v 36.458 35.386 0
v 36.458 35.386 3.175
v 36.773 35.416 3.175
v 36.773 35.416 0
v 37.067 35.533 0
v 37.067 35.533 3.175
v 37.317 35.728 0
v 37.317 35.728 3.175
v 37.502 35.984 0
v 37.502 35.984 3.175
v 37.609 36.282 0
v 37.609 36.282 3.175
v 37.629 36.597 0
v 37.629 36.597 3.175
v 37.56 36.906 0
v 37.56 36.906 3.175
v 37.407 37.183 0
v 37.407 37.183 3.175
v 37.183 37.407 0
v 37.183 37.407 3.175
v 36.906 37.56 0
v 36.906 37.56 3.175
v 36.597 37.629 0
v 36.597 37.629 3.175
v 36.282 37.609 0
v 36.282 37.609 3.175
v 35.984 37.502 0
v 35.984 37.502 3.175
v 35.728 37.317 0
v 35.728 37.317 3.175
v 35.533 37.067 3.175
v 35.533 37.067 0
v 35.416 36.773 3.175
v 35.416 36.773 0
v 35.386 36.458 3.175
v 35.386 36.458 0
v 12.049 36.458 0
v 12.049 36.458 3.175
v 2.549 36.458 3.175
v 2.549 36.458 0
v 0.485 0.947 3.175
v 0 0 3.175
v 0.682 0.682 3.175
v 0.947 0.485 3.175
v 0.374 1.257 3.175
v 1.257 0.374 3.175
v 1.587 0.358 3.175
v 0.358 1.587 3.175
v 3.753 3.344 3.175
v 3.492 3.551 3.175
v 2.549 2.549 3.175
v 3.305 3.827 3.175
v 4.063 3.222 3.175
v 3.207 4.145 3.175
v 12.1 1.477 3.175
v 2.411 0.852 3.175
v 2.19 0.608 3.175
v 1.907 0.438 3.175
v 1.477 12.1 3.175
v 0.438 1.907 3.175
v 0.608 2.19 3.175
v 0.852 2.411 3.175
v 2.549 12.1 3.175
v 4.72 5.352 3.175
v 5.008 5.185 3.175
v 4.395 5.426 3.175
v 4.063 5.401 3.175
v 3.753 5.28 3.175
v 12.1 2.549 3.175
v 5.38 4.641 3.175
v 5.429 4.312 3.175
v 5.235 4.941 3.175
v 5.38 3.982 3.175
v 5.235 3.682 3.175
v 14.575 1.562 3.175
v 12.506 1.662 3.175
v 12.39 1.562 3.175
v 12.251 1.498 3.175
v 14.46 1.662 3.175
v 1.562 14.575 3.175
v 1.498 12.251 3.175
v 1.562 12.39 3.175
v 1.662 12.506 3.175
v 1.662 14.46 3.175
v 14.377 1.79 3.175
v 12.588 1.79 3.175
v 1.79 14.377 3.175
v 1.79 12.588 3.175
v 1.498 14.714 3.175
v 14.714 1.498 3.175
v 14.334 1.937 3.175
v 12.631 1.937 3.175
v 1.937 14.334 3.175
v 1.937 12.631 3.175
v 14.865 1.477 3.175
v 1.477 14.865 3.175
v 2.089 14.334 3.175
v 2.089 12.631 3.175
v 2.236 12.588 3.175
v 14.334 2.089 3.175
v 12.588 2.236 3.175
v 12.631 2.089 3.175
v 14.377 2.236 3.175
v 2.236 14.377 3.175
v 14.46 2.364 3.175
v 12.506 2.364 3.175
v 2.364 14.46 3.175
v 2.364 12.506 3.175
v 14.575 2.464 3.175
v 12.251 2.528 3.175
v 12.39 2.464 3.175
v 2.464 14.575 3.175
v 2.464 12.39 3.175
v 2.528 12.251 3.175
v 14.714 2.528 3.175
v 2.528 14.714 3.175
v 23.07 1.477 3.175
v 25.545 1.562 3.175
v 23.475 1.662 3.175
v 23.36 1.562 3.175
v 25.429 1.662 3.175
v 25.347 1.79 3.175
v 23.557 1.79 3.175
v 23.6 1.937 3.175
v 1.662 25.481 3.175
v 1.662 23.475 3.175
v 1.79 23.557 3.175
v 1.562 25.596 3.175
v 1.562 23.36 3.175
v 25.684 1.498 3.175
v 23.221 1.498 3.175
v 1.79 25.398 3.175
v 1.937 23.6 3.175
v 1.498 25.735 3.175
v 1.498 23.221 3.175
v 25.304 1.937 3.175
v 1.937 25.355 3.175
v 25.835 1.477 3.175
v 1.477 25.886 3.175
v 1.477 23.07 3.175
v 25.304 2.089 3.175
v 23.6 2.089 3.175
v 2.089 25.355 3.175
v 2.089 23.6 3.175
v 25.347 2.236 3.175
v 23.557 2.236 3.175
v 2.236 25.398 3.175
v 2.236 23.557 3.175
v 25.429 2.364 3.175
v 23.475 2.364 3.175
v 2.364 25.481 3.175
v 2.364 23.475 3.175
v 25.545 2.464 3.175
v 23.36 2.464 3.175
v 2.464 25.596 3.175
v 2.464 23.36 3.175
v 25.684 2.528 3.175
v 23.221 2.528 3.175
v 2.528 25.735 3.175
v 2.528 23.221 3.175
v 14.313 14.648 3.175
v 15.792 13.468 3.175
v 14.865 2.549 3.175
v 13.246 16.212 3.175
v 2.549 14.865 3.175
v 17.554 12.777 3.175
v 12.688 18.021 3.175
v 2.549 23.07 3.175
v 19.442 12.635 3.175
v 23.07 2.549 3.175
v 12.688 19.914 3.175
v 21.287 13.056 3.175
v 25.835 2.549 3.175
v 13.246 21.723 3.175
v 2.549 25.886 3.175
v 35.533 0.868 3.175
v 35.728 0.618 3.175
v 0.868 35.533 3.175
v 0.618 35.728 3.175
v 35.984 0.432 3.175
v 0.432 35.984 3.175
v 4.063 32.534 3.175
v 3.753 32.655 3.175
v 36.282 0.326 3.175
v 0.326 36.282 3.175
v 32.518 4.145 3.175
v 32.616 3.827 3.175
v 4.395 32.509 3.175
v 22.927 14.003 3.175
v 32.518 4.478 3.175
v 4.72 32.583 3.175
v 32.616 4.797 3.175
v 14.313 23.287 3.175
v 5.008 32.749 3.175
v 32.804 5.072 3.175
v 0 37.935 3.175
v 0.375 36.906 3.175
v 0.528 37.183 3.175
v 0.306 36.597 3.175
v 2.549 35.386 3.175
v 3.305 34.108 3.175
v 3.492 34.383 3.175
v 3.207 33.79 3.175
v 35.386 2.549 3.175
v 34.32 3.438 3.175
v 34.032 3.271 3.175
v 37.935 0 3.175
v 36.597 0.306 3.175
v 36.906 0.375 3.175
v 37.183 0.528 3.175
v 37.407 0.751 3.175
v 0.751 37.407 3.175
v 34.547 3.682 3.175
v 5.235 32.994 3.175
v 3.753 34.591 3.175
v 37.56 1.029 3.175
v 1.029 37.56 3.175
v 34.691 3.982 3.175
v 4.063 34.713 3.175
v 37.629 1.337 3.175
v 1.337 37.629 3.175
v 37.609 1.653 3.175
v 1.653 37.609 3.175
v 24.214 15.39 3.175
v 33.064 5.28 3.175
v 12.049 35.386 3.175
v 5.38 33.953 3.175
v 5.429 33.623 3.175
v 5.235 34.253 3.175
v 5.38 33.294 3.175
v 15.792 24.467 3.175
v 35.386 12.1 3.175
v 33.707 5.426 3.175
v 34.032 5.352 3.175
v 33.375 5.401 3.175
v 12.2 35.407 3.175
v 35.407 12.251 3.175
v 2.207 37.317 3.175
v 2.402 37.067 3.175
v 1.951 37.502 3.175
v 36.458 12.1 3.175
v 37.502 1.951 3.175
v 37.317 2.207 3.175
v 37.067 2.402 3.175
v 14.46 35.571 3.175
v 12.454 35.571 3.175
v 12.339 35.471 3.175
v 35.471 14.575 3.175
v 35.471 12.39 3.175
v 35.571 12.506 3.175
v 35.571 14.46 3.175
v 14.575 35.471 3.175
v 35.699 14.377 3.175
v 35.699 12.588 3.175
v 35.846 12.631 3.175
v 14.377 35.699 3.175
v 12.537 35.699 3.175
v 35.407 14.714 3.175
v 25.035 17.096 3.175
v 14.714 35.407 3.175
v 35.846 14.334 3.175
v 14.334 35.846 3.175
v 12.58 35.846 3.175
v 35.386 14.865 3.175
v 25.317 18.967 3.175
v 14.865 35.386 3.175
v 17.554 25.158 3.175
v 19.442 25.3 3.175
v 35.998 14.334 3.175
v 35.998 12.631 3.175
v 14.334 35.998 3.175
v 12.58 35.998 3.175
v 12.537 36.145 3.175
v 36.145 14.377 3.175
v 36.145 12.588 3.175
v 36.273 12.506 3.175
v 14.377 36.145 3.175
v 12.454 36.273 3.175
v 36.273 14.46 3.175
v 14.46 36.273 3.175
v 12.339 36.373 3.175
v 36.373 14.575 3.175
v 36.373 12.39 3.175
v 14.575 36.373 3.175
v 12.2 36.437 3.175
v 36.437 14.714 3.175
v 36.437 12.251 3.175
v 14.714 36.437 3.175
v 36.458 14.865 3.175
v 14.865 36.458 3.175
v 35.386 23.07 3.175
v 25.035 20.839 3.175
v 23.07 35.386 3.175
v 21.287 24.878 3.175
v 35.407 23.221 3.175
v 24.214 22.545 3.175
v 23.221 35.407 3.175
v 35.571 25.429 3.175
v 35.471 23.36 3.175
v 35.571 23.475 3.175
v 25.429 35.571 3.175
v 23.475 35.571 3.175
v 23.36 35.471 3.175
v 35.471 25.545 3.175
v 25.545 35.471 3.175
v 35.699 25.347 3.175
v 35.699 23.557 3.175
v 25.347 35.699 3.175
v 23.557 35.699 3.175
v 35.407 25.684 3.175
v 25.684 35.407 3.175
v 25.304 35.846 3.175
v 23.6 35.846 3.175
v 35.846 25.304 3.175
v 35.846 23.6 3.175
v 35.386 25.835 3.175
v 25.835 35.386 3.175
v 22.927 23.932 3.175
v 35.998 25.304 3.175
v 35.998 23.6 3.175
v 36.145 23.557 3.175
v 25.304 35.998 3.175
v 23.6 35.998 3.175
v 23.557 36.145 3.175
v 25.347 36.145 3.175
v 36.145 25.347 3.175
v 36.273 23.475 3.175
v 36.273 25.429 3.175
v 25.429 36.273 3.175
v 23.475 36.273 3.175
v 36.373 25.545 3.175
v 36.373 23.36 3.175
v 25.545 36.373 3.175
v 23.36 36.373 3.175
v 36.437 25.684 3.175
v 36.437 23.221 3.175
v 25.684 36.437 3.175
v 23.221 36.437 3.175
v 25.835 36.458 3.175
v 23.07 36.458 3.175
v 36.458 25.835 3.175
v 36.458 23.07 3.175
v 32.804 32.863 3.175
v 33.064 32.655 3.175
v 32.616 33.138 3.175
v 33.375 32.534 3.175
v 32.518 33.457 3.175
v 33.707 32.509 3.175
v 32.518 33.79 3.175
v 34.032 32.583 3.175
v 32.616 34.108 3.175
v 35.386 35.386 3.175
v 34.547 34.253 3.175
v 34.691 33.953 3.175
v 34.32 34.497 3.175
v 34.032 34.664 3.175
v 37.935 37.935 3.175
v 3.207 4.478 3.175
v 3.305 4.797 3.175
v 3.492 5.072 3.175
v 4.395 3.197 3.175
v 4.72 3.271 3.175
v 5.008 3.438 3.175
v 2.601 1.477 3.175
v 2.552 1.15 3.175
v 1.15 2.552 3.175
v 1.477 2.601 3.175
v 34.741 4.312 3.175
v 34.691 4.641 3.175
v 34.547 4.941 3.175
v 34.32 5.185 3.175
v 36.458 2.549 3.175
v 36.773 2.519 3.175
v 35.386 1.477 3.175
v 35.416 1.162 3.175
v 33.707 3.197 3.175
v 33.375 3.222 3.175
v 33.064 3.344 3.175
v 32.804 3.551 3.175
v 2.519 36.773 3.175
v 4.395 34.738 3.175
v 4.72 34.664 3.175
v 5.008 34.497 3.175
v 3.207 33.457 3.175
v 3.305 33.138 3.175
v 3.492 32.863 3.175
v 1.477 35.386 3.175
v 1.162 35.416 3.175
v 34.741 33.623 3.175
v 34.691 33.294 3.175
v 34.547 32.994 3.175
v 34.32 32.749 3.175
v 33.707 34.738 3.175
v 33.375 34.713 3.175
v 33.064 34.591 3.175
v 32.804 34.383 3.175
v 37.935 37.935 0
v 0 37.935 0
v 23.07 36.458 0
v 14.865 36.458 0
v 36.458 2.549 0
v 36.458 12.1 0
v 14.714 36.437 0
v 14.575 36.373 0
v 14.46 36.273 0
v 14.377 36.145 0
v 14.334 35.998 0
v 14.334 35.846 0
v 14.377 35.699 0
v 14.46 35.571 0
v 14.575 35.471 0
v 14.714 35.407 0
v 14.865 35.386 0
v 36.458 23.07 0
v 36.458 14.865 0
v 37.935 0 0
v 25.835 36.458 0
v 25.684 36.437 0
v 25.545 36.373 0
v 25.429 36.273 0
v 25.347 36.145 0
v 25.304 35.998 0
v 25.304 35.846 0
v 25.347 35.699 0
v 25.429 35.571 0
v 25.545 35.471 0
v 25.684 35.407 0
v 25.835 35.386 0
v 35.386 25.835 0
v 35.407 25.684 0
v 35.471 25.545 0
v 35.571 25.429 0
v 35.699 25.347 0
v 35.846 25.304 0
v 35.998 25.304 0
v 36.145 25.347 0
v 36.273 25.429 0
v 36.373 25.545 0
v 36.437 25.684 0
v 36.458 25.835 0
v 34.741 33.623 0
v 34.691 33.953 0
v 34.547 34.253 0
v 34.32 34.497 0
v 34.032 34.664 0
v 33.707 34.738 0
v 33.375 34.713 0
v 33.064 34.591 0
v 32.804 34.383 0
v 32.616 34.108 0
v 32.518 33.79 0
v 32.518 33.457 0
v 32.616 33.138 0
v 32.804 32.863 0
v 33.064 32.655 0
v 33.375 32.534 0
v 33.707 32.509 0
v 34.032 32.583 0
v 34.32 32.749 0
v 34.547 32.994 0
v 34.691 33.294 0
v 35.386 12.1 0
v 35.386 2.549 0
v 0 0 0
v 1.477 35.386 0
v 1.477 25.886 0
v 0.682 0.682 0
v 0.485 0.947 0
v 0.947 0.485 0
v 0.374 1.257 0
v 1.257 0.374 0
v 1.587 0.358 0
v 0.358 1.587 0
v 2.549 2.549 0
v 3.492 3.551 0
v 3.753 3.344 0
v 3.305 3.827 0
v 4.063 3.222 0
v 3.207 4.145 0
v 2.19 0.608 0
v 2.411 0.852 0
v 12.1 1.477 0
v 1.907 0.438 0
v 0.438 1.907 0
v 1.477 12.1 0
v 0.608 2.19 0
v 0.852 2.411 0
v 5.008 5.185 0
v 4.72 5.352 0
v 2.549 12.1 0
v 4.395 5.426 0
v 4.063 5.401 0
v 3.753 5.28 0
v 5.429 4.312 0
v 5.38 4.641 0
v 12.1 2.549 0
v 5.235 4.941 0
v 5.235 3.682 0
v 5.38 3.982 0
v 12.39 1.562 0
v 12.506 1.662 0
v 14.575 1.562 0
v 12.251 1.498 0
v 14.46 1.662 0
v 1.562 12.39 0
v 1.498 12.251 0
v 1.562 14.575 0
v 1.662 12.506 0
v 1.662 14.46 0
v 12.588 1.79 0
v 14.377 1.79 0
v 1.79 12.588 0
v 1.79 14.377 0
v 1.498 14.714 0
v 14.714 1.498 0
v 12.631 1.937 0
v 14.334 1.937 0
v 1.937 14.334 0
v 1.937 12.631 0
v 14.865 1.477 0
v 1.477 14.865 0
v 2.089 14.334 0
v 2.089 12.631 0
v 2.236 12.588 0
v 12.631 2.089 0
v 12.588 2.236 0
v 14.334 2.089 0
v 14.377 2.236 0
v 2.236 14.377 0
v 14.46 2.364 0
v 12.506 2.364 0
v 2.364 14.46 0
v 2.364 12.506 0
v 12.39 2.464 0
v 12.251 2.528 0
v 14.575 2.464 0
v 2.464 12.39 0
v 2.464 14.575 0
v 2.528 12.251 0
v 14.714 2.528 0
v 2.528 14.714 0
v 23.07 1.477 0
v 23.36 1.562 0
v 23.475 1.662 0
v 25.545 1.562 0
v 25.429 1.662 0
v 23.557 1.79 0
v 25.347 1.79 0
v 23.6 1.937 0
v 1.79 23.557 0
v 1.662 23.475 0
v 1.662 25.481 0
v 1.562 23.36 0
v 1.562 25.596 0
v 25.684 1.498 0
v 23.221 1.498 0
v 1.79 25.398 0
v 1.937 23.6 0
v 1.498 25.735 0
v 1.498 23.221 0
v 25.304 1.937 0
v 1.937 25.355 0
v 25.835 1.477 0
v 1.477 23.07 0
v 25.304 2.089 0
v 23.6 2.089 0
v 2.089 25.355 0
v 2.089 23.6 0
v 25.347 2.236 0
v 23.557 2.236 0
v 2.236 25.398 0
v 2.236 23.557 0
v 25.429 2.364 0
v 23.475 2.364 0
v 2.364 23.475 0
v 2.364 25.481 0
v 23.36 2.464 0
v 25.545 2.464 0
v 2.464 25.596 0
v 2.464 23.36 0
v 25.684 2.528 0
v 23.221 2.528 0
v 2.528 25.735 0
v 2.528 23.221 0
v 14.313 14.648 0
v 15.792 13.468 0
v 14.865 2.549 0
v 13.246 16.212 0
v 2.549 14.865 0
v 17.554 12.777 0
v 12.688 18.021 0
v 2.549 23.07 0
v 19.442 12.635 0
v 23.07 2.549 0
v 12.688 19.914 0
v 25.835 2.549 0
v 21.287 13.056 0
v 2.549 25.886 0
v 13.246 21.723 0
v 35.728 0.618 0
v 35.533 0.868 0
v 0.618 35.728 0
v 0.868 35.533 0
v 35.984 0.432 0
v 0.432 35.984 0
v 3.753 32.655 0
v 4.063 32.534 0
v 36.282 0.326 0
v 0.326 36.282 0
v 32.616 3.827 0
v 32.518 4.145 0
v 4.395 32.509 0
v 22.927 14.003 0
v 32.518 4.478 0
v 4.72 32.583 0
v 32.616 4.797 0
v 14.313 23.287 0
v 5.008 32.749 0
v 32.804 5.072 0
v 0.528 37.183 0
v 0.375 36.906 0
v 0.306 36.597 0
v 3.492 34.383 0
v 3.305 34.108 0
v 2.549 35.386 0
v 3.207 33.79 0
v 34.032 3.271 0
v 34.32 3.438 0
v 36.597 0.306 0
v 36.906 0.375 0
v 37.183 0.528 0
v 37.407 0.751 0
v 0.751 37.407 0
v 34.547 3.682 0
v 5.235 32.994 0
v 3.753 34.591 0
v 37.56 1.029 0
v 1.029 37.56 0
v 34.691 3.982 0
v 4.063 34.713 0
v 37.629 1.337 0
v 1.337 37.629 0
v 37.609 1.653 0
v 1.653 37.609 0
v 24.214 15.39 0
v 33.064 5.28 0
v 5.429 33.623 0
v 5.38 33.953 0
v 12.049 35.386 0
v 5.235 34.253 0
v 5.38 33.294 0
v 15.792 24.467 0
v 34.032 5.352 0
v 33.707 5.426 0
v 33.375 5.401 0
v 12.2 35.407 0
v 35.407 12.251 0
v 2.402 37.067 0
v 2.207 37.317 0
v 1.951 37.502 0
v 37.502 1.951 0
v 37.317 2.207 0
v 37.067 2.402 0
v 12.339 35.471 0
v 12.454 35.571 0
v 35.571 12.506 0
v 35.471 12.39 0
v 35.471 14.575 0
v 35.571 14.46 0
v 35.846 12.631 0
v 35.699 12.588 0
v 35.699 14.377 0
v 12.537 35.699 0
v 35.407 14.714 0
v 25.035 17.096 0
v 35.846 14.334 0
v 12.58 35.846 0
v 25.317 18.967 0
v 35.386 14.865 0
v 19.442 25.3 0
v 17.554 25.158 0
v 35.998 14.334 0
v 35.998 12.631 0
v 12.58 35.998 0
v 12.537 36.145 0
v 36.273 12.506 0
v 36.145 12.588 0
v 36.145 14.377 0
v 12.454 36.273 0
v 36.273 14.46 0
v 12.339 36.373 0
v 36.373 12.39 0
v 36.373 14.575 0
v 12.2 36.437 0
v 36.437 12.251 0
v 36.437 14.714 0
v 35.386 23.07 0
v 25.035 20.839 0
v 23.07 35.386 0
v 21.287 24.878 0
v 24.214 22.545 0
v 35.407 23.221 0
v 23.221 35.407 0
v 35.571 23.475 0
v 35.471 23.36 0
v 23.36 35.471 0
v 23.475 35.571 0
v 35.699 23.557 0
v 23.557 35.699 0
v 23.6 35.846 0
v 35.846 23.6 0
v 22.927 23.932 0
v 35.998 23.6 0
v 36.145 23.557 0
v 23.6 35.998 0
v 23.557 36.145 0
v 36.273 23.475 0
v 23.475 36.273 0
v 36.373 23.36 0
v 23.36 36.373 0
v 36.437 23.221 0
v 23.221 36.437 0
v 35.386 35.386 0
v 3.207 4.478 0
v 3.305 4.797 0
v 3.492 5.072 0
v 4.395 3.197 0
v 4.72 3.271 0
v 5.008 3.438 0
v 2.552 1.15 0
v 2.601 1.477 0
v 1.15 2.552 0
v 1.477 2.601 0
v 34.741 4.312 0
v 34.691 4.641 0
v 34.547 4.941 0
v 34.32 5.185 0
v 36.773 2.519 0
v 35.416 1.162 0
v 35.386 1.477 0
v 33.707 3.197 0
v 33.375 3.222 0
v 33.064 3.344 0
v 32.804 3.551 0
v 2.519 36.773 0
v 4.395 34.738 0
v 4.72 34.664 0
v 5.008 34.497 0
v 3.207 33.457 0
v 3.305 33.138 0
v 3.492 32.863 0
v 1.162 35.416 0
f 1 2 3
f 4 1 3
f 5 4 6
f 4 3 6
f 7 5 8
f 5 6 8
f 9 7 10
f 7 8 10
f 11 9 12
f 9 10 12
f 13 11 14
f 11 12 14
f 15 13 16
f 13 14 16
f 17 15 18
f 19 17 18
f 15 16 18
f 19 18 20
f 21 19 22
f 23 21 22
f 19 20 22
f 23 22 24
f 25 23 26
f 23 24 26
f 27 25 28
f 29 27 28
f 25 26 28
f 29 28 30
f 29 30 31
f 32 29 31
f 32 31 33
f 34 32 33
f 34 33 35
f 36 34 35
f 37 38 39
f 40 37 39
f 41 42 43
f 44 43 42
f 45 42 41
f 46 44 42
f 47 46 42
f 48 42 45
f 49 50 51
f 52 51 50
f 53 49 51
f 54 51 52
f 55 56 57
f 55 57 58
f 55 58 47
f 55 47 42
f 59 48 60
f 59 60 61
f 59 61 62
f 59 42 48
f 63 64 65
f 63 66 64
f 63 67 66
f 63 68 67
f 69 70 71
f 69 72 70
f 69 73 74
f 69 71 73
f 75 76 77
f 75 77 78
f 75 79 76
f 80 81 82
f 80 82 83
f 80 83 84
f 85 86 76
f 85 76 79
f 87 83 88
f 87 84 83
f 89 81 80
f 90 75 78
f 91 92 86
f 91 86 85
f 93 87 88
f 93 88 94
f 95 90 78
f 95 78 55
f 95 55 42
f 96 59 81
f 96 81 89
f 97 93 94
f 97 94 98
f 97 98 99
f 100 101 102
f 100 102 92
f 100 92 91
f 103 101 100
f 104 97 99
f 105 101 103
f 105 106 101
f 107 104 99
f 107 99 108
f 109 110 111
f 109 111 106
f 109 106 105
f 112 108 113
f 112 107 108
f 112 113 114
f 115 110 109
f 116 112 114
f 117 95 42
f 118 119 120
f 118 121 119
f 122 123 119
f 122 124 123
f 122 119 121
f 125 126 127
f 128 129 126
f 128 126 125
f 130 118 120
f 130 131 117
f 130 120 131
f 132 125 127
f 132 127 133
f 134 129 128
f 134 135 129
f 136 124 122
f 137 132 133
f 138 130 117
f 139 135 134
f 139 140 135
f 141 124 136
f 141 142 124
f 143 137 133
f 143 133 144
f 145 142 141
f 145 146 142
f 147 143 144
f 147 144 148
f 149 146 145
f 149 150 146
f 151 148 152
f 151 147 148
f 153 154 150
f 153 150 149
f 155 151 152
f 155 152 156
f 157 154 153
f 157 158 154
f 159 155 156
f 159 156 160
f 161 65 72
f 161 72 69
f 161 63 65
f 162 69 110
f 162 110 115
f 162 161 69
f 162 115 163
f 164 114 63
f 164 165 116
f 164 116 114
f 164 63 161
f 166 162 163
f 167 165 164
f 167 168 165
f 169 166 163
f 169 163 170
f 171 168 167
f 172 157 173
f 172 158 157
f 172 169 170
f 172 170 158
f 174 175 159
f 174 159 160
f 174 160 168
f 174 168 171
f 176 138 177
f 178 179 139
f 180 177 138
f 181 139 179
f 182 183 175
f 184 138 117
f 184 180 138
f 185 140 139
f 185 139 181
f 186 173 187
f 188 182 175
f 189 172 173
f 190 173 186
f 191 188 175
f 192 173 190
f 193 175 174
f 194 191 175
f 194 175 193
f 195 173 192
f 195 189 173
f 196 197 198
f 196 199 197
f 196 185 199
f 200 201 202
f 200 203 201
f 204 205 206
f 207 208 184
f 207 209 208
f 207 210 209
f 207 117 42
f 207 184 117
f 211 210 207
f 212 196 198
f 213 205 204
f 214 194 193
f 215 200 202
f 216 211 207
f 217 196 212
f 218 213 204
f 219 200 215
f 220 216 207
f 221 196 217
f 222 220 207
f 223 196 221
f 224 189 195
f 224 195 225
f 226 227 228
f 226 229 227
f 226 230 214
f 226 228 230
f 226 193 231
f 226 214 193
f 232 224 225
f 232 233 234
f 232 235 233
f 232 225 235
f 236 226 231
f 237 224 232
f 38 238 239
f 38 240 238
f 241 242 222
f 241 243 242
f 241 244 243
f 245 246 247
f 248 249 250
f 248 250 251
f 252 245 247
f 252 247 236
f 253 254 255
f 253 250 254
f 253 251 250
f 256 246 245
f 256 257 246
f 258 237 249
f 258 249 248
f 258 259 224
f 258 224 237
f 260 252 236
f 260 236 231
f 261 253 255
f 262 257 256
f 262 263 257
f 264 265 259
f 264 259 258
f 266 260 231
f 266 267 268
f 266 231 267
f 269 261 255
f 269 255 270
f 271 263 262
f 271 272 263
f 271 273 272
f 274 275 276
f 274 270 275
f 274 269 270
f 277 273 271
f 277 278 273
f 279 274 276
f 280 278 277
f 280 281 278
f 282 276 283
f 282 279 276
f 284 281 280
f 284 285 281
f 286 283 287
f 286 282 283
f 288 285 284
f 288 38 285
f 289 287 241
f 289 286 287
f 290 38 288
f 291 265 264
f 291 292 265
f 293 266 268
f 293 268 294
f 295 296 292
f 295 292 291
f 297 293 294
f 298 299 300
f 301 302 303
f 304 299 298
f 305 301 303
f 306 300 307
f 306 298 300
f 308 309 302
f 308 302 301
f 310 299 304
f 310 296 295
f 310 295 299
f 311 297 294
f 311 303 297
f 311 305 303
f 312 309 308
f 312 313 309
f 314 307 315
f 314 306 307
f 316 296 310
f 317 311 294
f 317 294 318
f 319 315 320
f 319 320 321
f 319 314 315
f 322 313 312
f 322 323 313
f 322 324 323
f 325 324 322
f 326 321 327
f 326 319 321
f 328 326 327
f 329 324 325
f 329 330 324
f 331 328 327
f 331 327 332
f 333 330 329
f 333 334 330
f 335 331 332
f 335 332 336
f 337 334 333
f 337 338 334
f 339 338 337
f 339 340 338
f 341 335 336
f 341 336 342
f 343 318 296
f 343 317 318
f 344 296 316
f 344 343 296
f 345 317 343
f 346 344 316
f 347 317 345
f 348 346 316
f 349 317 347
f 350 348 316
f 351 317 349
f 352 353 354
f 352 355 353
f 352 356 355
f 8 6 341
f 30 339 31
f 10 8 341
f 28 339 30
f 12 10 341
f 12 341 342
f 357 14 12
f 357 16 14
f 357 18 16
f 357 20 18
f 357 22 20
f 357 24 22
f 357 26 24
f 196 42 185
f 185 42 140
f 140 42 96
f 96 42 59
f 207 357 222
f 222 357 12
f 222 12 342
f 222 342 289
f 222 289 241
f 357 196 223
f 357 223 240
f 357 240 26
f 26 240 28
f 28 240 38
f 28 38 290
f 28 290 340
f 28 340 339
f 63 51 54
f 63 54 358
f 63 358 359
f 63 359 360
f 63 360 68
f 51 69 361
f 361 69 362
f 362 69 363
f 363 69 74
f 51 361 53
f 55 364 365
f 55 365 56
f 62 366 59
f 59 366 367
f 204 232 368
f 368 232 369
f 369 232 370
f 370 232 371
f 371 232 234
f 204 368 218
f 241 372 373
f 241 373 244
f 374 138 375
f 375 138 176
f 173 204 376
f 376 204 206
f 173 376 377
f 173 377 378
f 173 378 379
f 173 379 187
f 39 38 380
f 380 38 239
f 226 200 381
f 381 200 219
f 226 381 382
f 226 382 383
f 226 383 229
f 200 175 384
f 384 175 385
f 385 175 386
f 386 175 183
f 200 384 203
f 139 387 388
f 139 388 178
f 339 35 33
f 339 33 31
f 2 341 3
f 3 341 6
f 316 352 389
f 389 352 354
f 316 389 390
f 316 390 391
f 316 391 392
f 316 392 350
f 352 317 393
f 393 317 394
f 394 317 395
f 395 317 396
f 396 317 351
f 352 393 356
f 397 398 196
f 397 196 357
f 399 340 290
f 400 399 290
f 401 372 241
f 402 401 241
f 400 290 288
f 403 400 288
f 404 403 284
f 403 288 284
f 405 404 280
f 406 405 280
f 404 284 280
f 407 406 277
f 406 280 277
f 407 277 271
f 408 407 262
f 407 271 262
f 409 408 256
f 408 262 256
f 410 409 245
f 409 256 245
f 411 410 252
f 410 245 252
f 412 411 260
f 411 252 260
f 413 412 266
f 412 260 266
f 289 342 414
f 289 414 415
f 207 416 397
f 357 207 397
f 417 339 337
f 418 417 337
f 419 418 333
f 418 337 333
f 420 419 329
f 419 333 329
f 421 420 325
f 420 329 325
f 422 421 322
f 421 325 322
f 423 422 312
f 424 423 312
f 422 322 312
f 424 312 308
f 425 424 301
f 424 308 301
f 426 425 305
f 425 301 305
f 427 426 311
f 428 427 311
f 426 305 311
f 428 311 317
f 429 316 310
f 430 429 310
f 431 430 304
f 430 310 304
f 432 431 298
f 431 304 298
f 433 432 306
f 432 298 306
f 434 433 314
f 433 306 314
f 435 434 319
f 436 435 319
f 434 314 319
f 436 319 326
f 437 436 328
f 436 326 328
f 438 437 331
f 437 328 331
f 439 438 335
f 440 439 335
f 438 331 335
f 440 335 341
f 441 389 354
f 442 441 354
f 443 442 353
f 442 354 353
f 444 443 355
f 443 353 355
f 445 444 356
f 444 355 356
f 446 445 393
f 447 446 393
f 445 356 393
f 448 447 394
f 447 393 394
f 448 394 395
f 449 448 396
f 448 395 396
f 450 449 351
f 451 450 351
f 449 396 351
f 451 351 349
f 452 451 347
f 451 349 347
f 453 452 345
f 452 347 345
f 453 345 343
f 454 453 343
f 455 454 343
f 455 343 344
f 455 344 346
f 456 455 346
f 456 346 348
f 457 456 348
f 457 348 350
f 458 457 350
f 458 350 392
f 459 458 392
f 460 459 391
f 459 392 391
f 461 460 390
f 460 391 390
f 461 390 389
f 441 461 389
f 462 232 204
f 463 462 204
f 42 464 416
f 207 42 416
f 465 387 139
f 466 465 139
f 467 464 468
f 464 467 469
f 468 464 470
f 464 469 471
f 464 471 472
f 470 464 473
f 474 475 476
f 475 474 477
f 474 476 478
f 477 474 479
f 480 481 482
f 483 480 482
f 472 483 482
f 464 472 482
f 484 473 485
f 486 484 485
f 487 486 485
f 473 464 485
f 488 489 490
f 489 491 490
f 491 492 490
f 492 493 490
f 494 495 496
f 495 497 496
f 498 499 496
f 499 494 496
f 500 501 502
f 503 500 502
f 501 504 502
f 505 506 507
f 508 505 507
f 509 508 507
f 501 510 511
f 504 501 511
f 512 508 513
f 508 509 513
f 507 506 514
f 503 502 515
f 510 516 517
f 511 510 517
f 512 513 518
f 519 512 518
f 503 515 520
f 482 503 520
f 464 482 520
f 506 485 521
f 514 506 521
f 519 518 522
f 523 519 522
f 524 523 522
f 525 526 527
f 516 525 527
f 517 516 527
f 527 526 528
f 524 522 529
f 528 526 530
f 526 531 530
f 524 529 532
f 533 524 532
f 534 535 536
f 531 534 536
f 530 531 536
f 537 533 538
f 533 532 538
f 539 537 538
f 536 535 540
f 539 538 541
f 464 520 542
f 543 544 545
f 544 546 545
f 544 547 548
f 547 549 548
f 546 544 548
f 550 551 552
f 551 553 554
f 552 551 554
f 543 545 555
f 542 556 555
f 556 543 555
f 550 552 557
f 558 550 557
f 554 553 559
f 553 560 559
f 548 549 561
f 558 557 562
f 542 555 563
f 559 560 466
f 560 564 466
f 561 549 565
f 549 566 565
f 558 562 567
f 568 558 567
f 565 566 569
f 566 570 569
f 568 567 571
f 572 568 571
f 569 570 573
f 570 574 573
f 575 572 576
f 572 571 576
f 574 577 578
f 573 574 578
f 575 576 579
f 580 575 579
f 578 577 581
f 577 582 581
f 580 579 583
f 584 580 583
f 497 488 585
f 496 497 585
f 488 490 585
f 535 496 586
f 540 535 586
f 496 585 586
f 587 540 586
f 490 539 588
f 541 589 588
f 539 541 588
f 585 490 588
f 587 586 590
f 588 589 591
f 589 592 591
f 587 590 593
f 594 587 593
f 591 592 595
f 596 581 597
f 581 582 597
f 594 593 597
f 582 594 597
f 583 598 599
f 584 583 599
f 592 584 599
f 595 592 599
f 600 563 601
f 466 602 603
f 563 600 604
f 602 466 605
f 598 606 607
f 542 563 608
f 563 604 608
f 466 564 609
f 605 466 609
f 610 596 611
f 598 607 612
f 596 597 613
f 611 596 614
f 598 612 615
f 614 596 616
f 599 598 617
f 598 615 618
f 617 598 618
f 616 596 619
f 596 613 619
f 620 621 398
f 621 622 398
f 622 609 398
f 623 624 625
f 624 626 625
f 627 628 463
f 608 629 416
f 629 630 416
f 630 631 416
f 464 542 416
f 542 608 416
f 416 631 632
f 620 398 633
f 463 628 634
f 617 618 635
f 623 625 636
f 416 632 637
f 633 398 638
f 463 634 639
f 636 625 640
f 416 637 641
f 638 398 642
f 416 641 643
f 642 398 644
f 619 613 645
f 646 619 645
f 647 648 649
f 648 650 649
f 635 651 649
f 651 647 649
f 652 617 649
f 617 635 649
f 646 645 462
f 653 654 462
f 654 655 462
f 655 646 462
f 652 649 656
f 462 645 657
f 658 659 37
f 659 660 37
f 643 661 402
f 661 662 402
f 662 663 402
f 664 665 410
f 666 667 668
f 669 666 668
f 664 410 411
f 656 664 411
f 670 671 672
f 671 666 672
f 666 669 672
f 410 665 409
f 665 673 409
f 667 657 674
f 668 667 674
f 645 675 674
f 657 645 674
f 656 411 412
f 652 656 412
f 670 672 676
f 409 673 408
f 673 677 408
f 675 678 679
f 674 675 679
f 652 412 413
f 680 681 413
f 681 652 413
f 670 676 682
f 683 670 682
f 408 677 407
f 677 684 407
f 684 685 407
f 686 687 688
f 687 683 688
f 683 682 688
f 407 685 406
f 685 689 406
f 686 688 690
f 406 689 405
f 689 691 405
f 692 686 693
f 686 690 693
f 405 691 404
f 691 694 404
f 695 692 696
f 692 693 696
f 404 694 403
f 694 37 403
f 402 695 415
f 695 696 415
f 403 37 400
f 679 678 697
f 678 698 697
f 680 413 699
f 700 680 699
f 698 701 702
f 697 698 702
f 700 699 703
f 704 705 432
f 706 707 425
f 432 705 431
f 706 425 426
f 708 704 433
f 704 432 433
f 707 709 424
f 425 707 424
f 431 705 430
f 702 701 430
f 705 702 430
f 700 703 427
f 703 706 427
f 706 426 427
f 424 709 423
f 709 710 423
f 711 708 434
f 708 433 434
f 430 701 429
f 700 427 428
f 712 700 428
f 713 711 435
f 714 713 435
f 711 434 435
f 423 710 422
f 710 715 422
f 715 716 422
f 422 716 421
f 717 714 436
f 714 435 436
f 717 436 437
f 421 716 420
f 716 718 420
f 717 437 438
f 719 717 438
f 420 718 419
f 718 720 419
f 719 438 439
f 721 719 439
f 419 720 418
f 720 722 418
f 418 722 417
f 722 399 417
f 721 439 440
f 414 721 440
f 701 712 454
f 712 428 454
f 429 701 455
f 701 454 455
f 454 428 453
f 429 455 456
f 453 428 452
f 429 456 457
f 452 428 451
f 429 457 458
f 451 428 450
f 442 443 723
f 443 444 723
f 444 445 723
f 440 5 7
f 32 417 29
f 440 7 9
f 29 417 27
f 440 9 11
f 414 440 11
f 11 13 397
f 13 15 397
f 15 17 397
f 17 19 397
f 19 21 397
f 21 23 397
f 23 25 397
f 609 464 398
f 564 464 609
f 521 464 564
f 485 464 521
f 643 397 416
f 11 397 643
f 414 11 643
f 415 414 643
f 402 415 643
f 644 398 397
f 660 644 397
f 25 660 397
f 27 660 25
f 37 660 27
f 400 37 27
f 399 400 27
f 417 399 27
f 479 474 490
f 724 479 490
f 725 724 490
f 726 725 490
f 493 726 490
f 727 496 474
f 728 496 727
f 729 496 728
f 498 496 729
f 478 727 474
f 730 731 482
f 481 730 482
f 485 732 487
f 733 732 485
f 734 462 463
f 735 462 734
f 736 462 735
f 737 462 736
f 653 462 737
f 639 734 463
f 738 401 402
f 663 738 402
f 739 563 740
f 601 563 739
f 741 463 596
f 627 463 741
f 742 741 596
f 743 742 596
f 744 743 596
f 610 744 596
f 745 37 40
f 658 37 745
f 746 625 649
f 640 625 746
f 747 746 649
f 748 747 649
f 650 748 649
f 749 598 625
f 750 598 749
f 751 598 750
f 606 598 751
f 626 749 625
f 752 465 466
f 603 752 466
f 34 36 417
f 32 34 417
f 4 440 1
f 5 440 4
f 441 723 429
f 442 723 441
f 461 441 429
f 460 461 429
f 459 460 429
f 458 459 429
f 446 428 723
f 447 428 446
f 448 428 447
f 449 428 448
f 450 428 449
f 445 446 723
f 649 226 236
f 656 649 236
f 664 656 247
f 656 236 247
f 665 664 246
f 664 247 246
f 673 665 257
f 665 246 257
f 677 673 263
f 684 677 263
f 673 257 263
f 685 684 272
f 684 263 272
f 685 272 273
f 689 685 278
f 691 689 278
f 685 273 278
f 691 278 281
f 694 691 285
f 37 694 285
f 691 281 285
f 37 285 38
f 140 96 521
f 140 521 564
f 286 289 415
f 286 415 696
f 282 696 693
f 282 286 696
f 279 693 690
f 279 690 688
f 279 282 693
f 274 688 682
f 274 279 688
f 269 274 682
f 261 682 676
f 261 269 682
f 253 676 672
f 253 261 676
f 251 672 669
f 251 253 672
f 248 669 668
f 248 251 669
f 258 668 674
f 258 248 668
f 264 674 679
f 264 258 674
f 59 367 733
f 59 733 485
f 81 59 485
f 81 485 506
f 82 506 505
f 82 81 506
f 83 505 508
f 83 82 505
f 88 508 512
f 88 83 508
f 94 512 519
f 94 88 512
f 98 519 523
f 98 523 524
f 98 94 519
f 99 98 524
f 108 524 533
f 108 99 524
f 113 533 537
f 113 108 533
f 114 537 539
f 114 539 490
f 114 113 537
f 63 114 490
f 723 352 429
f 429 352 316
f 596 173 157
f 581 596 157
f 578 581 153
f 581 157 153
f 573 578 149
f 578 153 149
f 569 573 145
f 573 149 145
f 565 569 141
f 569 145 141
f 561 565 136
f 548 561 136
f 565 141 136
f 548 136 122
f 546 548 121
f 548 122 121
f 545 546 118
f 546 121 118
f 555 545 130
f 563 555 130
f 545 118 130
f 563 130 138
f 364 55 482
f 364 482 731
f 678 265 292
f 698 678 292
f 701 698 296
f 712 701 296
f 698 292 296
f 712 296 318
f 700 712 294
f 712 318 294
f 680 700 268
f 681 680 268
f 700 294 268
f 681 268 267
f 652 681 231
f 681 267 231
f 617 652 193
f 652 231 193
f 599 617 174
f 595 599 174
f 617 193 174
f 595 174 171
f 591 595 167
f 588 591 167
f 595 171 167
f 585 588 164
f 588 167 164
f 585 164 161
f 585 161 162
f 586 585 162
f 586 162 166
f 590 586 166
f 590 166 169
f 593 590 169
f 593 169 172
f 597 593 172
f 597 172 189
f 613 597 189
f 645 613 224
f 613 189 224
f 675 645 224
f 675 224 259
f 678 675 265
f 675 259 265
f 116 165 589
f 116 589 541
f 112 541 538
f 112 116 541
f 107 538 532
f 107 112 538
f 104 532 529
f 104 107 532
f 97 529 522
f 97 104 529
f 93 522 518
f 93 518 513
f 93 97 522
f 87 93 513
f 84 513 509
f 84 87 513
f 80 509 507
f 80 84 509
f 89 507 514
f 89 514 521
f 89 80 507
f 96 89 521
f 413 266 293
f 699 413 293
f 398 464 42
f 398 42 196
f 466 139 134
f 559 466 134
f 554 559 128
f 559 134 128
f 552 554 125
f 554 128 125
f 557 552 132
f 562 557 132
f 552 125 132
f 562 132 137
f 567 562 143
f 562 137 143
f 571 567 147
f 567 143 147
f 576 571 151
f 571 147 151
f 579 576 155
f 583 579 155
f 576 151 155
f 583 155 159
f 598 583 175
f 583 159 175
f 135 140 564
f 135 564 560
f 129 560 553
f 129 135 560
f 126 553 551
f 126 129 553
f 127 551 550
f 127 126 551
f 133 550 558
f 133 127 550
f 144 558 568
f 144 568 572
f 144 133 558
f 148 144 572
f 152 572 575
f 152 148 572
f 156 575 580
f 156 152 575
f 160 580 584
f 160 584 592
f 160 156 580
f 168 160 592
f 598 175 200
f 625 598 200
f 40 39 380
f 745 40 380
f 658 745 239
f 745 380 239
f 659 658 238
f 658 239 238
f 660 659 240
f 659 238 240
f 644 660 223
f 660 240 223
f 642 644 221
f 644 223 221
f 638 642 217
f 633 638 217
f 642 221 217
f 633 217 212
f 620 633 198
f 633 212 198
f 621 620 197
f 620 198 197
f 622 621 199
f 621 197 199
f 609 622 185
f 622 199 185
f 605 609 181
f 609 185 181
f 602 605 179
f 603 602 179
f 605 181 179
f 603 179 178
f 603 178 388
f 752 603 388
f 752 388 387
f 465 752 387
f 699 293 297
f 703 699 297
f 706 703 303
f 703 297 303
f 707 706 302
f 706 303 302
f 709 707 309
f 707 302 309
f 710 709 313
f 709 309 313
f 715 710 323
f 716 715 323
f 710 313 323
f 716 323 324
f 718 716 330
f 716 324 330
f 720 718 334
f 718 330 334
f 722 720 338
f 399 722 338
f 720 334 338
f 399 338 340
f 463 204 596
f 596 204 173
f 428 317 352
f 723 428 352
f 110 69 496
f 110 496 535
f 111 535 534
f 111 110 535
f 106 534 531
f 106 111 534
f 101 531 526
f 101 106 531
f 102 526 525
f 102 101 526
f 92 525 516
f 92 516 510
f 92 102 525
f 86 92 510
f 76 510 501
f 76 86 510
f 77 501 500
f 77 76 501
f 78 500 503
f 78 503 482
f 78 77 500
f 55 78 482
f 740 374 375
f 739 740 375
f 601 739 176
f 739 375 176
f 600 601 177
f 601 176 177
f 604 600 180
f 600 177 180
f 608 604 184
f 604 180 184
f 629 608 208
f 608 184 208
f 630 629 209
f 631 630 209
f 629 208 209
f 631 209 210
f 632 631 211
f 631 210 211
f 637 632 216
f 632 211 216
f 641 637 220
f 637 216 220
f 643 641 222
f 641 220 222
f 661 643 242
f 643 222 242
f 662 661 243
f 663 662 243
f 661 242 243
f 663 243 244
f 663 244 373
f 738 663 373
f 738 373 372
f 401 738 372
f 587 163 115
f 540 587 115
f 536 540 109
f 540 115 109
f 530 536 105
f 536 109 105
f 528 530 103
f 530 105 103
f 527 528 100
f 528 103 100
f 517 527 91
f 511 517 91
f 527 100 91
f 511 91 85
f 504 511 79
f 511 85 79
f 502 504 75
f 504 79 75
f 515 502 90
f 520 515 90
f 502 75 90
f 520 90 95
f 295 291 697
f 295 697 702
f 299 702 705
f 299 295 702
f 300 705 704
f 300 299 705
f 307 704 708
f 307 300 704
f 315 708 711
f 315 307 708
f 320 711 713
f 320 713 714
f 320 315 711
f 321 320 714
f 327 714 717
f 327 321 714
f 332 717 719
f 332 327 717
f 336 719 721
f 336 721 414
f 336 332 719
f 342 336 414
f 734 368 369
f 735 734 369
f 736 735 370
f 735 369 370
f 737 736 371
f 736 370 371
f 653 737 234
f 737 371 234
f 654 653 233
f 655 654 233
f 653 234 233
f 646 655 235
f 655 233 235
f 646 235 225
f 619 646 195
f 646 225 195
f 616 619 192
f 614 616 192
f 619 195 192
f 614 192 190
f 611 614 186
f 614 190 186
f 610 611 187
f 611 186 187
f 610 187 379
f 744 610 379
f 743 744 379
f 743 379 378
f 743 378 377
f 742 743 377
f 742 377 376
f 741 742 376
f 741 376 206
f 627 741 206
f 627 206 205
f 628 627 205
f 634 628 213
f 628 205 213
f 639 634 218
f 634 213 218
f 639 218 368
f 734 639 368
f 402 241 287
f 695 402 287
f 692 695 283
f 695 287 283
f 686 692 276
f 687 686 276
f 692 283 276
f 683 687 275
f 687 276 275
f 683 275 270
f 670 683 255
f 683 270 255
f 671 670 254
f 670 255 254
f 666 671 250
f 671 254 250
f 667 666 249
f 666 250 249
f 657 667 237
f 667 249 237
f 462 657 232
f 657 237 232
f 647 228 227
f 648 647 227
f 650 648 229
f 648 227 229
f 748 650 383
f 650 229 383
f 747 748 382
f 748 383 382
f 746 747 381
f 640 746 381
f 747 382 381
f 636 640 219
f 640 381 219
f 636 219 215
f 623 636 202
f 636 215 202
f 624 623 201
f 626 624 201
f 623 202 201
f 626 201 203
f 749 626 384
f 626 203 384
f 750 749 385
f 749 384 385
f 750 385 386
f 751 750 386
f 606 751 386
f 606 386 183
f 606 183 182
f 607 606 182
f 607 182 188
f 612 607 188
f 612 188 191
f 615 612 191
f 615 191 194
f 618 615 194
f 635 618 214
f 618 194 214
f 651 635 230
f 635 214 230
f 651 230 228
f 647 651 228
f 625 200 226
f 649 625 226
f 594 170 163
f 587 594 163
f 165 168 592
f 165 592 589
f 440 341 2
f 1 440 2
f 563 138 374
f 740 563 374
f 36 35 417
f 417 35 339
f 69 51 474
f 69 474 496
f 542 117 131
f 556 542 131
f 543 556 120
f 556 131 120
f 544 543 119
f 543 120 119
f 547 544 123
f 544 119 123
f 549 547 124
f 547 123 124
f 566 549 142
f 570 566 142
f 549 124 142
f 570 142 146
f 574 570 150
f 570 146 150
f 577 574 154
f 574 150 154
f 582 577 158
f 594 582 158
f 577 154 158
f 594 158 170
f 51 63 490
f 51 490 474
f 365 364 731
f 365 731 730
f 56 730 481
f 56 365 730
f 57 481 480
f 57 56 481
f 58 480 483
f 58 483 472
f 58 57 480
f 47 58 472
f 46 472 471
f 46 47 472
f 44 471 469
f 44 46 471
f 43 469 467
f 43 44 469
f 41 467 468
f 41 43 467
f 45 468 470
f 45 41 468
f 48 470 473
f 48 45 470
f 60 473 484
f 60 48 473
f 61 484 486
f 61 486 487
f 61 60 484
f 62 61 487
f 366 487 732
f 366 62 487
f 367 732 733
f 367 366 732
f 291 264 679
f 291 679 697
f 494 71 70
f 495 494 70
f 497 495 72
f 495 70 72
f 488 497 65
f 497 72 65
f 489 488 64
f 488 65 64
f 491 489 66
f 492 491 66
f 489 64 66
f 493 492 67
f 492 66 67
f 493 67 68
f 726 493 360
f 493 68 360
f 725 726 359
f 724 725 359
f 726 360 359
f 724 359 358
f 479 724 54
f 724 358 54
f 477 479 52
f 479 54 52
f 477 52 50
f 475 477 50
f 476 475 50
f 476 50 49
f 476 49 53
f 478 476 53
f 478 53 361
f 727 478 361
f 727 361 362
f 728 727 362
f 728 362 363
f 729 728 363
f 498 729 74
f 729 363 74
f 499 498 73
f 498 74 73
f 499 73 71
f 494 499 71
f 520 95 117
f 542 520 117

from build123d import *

# Parameters (mm, degrees)
SKETCH1_W           = 37.9349
SKETCH1_H           = 37.9349
BOSS_EXTRUDE1_DEPTH = 3.175
SKETCH9_R           = 1.1176
SKETCH9_R_2         = 6.35
CUT_EXTRUDE2_DEPTH  = 3.175


with BuildPart() as part:
    # Sketch1 → Boss-Extrude1 (new body)
    with BuildSketch(Plane.XY):
        with Locations((18.96745, 18.96745)):
            Rectangle(SKETCH1_W, SKETCH1_H)
    extrude(amount=BOSS_EXTRUDE1_DEPTH)

    # Sketch9 → Cut-Extrude2 (cut)
    with BuildSketch(Plane.XY.offset(3.175)):
        with Locations((33.62325, 33.62325)):
            Circle(SKETCH9_R)
        with Locations((4.31165, 33.62325)):
            Circle(SKETCH9_R)
        with Locations((4.31165, 4.31165)):
            Circle(SKETCH9_R)
        with Locations((33.62325, 4.31165)):
            Circle(SKETCH9_R)
        with Locations((18.96745, 18.96745)):
            Circle(SKETCH9_R_2)
        with BuildLine():
            Line((35.385619933, 12.100169933), (35.385619933, 2.549280067))
            Line((35.385619933, 2.549280067), (25.834730067, 2.549280067))
            ThreePointArc((25.834730067, 2.549280067), (25.2984, 2.01295), (25.834730067, 1.476619933))
            Line((25.834730067, 1.476619933), (35.385619933, 1.476619933))
            ThreePointArc((35.385619933, 1.476619933), (37.303202335, 0.631697665), (36.458280067, 2.549280067))
            Line((36.458280067, 2.549280067), (36.458280067, 12.100169933))
            ThreePointArc((36.458280067, 12.100169933), (35.92195, 12.6365), (35.385619933, 12.100169933))
        make_face()
        with BuildLine():
            Line((35.385619933, 36.458280067), (25.834730067, 36.458280067))
            ThreePointArc((25.834730067, 36.458280067), (25.2984, 35.92195), (25.834730067, 35.385619933))
            Line((25.834730067, 35.385619933), (35.385619933, 35.385619933))
            Line((35.385619933, 35.385619933), (35.385619933, 25.834730067))
            ThreePointArc((35.385619933, 25.834730067), (35.92195, 25.2984), (36.458280067, 25.834730067))
            Line((36.458280067, 25.834730067), (36.458280067, 35.385619933))
            ThreePointArc((36.458280067, 35.385619933), (37.303202335, 37.303202335), (35.385619933, 36.458280067))
        make_face()
        with BuildLine():
            Line((12.048880067, 36.458280067), (2.549280067, 36.458280067))
            ThreePointArc((2.549280067, 36.458280067), (0.631697665, 37.303202335), (1.476619933, 35.385619933))
            Line((1.476619933, 35.385619933), (1.476619933, 25.886019933))
            ThreePointArc((1.476619933, 25.886019933), (2.01295, 25.349689867), (2.549280067, 25.886019933))
            Line((2.549280067, 25.886019933), (2.549280067, 35.385619933))
            Line((2.549280067, 35.385619933), (12.048880067, 35.385619933))
            ThreePointArc((12.048880067, 35.385619933), (12.585210133, 35.92195), (12.048880067, 36.458280067))
        make_face()
        with BuildLine():
            Line((23.06955, 36.458280067), (14.86535, 36.458280067))
            ThreePointArc((14.86535, 36.458280067), (14.329019933, 35.92195), (14.86535, 35.385619933))
            Line((14.86535, 35.385619933), (23.06955, 35.385619933))
            ThreePointArc((23.06955, 35.385619933), (23.605880067, 35.92195), (23.06955, 36.458280067))
        make_face()
        with BuildLine():
            Line((2.549280067, 23.06955), (2.549280067, 14.86535))
            ThreePointArc((2.549280067, 14.86535), (2.01295, 14.329019933), (1.476619933, 14.86535))
            Line((1.476619933, 14.86535), (1.476619933, 23.06955))
            ThreePointArc((1.476619933, 23.06955), (2.01295, 23.605880067), (2.549280067, 23.06955))
        make_face()
        with BuildLine():
            Line((36.458280067, 23.06955), (36.458280067, 14.86535))
            ThreePointArc((36.458280067, 14.86535), (35.92195, 14.329019933), (35.385619933, 14.86535))
            Line((35.385619933, 14.86535), (35.385619933, 23.06955))
            ThreePointArc((35.385619933, 23.06955), (35.92195, 23.605880067), (36.458280067, 23.06955))
        make_face()
        with BuildLine():
            Line((23.06955, 2.549280067), (14.86535, 2.549280067))
            ThreePointArc((14.86535, 2.549280067), (14.329019933, 2.01295), (14.86535, 1.476619933))
            Line((14.86535, 1.476619933), (23.06955, 1.476619933))
            ThreePointArc((23.06955, 1.476619933), (23.605880067, 2.01295), (23.06955, 2.549280067))
        make_face()
        with BuildLine():
            Line((2.549280067, 12.100169933), (2.549280067, 2.549280067))
            Line((2.549280067, 2.549280067), (12.100169933, 2.549280067))
            ThreePointArc((12.100169933, 2.549280067), (12.6365, 2.01295), (12.100169933, 1.476619933))
            Line((12.100169933, 1.476619933), (2.600569933, 1.476619933))
            ThreePointArc((2.600569933, 1.476619933), (0.681867267, 0.681867267), (1.476619933, 2.600569933))
            Line((1.476619933, 2.600569933), (1.476619933, 12.100169933))
            ThreePointArc((1.476619933, 12.100169933), (2.01295, 12.6365), (2.549280067, 12.100169933))
        make_face()
    extrude(amount=-CUT_EXTRUDE2_DEPTH, mode=Mode.SUBTRACT)


solid = part.part
